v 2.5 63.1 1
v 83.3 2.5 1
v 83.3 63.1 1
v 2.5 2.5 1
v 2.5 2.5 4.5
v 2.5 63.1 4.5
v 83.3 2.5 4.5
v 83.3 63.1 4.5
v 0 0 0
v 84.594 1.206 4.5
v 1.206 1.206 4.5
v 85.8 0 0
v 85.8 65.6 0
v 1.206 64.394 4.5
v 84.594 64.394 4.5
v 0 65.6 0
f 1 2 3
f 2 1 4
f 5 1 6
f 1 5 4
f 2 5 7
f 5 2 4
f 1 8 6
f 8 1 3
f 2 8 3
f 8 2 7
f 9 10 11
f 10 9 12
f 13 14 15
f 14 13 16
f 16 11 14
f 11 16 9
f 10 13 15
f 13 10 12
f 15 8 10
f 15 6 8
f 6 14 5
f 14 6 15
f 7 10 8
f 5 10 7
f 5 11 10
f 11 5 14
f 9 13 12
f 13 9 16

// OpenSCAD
// Copyright 2019 Pascal de Bruijn
// Licensed Creative Commons - Attribution - Share Alike

// in mm
tray_thickness = 1;

// in mm
tray_edge = 2.5;

// in mm
tray_buffer = 0;

// in degrees
tray_chamfer_angle = 15;

tray_open = 0; // [0:Closed,1:Open]

base_shape = 1; // [1:Square,0:Round]

// in mm
base_height = 3.5;

// in mm
base_width = 20;

// in mm
base_length = 20;

// in mm
base_tolerance = 0.2;

// in bases
count_width = 4;

// in bases
count_length = 3;


// in steps
$fn = 360;

difference ()
{

  cube([count_width * (base_width+base_tolerance+tray_buffer) + tray_edge*2, count_length * (base_length+base_tolerance+tray_buffer) + tray_edge*2, base_height + tray_thickness]);

  union ()
  {
    for (x = [0:1:count_width-1])
    {
      for (y = [0:1:count_length-1])
      {
        if (base_shape != 0)
        {
          translate([tray_edge + x*(base_width+base_tolerance+tray_buffer) + tray_buffer/2, tray_edge + y*(base_length+base_tolerance+tray_buffer) + tray_buffer/2, tray_thickness]) cube([base_width+base_tolerance, base_length+base_tolerance, base_height+1]);
        }
        else
        {
          translate([tray_edge + x*(base_width+base_tolerance+tray_buffer) + (base_width+base_tolerance+tray_buffer)/2, tray_edge + y*(base_length+base_tolerance+tray_buffer) + (base_length+base_tolerance+tray_buffer)/2, tray_thickness]) scale([1, base_length/base_width, 1]) cylinder(base_height+1, (base_width+base_tolerance)/2, (base_width+base_tolerance)/2);
        }
      }
    }

    if (tray_open > 0)
    {
      translate([tray_edge, count_length * (base_length+base_tolerance+tray_buffer) + tray_edge, tray_thickness]) cube([count_width * (base_width+base_tolerance+tray_buffer),tray_edge,base_height]);
    }
    
    translate([count_width * (base_width+base_tolerance+tray_buffer) + tray_edge*2, 0, 0]) rotate([
tray_chamfer_angle, 0, 180]) cube([count_width * (base_width+base_tolerance+tray_buffer) + tray_edge*2, 10, 10]);
    
    translate([0, count_length * (base_length+base_tolerance+tray_buffer) + tray_edge*2, 0]) rotate([
tray_chamfer_angle, 0, 0]) cube([count_width * (base_width+base_tolerance+tray_buffer) + tray_edge*2, 10, 10]);

    translate([0, count_length * (base_length+base_tolerance+tray_buffer) + tray_edge*2, 0]) rotate([0, -
tray_chamfer_angle, 180]) cube([10, count_length * (base_length+base_tolerance+tray_buffer) + tray_edge*2, 10]);

    translate([count_width * (base_width+base_tolerance+tray_buffer) + tray_edge*2, 0, 0]) rotate([0, -
tray_chamfer_angle, 0]) cube([10, count_length * (base_length+base_tolerance+tray_buffer) + tray_edge*2, 10]);

  }

}
